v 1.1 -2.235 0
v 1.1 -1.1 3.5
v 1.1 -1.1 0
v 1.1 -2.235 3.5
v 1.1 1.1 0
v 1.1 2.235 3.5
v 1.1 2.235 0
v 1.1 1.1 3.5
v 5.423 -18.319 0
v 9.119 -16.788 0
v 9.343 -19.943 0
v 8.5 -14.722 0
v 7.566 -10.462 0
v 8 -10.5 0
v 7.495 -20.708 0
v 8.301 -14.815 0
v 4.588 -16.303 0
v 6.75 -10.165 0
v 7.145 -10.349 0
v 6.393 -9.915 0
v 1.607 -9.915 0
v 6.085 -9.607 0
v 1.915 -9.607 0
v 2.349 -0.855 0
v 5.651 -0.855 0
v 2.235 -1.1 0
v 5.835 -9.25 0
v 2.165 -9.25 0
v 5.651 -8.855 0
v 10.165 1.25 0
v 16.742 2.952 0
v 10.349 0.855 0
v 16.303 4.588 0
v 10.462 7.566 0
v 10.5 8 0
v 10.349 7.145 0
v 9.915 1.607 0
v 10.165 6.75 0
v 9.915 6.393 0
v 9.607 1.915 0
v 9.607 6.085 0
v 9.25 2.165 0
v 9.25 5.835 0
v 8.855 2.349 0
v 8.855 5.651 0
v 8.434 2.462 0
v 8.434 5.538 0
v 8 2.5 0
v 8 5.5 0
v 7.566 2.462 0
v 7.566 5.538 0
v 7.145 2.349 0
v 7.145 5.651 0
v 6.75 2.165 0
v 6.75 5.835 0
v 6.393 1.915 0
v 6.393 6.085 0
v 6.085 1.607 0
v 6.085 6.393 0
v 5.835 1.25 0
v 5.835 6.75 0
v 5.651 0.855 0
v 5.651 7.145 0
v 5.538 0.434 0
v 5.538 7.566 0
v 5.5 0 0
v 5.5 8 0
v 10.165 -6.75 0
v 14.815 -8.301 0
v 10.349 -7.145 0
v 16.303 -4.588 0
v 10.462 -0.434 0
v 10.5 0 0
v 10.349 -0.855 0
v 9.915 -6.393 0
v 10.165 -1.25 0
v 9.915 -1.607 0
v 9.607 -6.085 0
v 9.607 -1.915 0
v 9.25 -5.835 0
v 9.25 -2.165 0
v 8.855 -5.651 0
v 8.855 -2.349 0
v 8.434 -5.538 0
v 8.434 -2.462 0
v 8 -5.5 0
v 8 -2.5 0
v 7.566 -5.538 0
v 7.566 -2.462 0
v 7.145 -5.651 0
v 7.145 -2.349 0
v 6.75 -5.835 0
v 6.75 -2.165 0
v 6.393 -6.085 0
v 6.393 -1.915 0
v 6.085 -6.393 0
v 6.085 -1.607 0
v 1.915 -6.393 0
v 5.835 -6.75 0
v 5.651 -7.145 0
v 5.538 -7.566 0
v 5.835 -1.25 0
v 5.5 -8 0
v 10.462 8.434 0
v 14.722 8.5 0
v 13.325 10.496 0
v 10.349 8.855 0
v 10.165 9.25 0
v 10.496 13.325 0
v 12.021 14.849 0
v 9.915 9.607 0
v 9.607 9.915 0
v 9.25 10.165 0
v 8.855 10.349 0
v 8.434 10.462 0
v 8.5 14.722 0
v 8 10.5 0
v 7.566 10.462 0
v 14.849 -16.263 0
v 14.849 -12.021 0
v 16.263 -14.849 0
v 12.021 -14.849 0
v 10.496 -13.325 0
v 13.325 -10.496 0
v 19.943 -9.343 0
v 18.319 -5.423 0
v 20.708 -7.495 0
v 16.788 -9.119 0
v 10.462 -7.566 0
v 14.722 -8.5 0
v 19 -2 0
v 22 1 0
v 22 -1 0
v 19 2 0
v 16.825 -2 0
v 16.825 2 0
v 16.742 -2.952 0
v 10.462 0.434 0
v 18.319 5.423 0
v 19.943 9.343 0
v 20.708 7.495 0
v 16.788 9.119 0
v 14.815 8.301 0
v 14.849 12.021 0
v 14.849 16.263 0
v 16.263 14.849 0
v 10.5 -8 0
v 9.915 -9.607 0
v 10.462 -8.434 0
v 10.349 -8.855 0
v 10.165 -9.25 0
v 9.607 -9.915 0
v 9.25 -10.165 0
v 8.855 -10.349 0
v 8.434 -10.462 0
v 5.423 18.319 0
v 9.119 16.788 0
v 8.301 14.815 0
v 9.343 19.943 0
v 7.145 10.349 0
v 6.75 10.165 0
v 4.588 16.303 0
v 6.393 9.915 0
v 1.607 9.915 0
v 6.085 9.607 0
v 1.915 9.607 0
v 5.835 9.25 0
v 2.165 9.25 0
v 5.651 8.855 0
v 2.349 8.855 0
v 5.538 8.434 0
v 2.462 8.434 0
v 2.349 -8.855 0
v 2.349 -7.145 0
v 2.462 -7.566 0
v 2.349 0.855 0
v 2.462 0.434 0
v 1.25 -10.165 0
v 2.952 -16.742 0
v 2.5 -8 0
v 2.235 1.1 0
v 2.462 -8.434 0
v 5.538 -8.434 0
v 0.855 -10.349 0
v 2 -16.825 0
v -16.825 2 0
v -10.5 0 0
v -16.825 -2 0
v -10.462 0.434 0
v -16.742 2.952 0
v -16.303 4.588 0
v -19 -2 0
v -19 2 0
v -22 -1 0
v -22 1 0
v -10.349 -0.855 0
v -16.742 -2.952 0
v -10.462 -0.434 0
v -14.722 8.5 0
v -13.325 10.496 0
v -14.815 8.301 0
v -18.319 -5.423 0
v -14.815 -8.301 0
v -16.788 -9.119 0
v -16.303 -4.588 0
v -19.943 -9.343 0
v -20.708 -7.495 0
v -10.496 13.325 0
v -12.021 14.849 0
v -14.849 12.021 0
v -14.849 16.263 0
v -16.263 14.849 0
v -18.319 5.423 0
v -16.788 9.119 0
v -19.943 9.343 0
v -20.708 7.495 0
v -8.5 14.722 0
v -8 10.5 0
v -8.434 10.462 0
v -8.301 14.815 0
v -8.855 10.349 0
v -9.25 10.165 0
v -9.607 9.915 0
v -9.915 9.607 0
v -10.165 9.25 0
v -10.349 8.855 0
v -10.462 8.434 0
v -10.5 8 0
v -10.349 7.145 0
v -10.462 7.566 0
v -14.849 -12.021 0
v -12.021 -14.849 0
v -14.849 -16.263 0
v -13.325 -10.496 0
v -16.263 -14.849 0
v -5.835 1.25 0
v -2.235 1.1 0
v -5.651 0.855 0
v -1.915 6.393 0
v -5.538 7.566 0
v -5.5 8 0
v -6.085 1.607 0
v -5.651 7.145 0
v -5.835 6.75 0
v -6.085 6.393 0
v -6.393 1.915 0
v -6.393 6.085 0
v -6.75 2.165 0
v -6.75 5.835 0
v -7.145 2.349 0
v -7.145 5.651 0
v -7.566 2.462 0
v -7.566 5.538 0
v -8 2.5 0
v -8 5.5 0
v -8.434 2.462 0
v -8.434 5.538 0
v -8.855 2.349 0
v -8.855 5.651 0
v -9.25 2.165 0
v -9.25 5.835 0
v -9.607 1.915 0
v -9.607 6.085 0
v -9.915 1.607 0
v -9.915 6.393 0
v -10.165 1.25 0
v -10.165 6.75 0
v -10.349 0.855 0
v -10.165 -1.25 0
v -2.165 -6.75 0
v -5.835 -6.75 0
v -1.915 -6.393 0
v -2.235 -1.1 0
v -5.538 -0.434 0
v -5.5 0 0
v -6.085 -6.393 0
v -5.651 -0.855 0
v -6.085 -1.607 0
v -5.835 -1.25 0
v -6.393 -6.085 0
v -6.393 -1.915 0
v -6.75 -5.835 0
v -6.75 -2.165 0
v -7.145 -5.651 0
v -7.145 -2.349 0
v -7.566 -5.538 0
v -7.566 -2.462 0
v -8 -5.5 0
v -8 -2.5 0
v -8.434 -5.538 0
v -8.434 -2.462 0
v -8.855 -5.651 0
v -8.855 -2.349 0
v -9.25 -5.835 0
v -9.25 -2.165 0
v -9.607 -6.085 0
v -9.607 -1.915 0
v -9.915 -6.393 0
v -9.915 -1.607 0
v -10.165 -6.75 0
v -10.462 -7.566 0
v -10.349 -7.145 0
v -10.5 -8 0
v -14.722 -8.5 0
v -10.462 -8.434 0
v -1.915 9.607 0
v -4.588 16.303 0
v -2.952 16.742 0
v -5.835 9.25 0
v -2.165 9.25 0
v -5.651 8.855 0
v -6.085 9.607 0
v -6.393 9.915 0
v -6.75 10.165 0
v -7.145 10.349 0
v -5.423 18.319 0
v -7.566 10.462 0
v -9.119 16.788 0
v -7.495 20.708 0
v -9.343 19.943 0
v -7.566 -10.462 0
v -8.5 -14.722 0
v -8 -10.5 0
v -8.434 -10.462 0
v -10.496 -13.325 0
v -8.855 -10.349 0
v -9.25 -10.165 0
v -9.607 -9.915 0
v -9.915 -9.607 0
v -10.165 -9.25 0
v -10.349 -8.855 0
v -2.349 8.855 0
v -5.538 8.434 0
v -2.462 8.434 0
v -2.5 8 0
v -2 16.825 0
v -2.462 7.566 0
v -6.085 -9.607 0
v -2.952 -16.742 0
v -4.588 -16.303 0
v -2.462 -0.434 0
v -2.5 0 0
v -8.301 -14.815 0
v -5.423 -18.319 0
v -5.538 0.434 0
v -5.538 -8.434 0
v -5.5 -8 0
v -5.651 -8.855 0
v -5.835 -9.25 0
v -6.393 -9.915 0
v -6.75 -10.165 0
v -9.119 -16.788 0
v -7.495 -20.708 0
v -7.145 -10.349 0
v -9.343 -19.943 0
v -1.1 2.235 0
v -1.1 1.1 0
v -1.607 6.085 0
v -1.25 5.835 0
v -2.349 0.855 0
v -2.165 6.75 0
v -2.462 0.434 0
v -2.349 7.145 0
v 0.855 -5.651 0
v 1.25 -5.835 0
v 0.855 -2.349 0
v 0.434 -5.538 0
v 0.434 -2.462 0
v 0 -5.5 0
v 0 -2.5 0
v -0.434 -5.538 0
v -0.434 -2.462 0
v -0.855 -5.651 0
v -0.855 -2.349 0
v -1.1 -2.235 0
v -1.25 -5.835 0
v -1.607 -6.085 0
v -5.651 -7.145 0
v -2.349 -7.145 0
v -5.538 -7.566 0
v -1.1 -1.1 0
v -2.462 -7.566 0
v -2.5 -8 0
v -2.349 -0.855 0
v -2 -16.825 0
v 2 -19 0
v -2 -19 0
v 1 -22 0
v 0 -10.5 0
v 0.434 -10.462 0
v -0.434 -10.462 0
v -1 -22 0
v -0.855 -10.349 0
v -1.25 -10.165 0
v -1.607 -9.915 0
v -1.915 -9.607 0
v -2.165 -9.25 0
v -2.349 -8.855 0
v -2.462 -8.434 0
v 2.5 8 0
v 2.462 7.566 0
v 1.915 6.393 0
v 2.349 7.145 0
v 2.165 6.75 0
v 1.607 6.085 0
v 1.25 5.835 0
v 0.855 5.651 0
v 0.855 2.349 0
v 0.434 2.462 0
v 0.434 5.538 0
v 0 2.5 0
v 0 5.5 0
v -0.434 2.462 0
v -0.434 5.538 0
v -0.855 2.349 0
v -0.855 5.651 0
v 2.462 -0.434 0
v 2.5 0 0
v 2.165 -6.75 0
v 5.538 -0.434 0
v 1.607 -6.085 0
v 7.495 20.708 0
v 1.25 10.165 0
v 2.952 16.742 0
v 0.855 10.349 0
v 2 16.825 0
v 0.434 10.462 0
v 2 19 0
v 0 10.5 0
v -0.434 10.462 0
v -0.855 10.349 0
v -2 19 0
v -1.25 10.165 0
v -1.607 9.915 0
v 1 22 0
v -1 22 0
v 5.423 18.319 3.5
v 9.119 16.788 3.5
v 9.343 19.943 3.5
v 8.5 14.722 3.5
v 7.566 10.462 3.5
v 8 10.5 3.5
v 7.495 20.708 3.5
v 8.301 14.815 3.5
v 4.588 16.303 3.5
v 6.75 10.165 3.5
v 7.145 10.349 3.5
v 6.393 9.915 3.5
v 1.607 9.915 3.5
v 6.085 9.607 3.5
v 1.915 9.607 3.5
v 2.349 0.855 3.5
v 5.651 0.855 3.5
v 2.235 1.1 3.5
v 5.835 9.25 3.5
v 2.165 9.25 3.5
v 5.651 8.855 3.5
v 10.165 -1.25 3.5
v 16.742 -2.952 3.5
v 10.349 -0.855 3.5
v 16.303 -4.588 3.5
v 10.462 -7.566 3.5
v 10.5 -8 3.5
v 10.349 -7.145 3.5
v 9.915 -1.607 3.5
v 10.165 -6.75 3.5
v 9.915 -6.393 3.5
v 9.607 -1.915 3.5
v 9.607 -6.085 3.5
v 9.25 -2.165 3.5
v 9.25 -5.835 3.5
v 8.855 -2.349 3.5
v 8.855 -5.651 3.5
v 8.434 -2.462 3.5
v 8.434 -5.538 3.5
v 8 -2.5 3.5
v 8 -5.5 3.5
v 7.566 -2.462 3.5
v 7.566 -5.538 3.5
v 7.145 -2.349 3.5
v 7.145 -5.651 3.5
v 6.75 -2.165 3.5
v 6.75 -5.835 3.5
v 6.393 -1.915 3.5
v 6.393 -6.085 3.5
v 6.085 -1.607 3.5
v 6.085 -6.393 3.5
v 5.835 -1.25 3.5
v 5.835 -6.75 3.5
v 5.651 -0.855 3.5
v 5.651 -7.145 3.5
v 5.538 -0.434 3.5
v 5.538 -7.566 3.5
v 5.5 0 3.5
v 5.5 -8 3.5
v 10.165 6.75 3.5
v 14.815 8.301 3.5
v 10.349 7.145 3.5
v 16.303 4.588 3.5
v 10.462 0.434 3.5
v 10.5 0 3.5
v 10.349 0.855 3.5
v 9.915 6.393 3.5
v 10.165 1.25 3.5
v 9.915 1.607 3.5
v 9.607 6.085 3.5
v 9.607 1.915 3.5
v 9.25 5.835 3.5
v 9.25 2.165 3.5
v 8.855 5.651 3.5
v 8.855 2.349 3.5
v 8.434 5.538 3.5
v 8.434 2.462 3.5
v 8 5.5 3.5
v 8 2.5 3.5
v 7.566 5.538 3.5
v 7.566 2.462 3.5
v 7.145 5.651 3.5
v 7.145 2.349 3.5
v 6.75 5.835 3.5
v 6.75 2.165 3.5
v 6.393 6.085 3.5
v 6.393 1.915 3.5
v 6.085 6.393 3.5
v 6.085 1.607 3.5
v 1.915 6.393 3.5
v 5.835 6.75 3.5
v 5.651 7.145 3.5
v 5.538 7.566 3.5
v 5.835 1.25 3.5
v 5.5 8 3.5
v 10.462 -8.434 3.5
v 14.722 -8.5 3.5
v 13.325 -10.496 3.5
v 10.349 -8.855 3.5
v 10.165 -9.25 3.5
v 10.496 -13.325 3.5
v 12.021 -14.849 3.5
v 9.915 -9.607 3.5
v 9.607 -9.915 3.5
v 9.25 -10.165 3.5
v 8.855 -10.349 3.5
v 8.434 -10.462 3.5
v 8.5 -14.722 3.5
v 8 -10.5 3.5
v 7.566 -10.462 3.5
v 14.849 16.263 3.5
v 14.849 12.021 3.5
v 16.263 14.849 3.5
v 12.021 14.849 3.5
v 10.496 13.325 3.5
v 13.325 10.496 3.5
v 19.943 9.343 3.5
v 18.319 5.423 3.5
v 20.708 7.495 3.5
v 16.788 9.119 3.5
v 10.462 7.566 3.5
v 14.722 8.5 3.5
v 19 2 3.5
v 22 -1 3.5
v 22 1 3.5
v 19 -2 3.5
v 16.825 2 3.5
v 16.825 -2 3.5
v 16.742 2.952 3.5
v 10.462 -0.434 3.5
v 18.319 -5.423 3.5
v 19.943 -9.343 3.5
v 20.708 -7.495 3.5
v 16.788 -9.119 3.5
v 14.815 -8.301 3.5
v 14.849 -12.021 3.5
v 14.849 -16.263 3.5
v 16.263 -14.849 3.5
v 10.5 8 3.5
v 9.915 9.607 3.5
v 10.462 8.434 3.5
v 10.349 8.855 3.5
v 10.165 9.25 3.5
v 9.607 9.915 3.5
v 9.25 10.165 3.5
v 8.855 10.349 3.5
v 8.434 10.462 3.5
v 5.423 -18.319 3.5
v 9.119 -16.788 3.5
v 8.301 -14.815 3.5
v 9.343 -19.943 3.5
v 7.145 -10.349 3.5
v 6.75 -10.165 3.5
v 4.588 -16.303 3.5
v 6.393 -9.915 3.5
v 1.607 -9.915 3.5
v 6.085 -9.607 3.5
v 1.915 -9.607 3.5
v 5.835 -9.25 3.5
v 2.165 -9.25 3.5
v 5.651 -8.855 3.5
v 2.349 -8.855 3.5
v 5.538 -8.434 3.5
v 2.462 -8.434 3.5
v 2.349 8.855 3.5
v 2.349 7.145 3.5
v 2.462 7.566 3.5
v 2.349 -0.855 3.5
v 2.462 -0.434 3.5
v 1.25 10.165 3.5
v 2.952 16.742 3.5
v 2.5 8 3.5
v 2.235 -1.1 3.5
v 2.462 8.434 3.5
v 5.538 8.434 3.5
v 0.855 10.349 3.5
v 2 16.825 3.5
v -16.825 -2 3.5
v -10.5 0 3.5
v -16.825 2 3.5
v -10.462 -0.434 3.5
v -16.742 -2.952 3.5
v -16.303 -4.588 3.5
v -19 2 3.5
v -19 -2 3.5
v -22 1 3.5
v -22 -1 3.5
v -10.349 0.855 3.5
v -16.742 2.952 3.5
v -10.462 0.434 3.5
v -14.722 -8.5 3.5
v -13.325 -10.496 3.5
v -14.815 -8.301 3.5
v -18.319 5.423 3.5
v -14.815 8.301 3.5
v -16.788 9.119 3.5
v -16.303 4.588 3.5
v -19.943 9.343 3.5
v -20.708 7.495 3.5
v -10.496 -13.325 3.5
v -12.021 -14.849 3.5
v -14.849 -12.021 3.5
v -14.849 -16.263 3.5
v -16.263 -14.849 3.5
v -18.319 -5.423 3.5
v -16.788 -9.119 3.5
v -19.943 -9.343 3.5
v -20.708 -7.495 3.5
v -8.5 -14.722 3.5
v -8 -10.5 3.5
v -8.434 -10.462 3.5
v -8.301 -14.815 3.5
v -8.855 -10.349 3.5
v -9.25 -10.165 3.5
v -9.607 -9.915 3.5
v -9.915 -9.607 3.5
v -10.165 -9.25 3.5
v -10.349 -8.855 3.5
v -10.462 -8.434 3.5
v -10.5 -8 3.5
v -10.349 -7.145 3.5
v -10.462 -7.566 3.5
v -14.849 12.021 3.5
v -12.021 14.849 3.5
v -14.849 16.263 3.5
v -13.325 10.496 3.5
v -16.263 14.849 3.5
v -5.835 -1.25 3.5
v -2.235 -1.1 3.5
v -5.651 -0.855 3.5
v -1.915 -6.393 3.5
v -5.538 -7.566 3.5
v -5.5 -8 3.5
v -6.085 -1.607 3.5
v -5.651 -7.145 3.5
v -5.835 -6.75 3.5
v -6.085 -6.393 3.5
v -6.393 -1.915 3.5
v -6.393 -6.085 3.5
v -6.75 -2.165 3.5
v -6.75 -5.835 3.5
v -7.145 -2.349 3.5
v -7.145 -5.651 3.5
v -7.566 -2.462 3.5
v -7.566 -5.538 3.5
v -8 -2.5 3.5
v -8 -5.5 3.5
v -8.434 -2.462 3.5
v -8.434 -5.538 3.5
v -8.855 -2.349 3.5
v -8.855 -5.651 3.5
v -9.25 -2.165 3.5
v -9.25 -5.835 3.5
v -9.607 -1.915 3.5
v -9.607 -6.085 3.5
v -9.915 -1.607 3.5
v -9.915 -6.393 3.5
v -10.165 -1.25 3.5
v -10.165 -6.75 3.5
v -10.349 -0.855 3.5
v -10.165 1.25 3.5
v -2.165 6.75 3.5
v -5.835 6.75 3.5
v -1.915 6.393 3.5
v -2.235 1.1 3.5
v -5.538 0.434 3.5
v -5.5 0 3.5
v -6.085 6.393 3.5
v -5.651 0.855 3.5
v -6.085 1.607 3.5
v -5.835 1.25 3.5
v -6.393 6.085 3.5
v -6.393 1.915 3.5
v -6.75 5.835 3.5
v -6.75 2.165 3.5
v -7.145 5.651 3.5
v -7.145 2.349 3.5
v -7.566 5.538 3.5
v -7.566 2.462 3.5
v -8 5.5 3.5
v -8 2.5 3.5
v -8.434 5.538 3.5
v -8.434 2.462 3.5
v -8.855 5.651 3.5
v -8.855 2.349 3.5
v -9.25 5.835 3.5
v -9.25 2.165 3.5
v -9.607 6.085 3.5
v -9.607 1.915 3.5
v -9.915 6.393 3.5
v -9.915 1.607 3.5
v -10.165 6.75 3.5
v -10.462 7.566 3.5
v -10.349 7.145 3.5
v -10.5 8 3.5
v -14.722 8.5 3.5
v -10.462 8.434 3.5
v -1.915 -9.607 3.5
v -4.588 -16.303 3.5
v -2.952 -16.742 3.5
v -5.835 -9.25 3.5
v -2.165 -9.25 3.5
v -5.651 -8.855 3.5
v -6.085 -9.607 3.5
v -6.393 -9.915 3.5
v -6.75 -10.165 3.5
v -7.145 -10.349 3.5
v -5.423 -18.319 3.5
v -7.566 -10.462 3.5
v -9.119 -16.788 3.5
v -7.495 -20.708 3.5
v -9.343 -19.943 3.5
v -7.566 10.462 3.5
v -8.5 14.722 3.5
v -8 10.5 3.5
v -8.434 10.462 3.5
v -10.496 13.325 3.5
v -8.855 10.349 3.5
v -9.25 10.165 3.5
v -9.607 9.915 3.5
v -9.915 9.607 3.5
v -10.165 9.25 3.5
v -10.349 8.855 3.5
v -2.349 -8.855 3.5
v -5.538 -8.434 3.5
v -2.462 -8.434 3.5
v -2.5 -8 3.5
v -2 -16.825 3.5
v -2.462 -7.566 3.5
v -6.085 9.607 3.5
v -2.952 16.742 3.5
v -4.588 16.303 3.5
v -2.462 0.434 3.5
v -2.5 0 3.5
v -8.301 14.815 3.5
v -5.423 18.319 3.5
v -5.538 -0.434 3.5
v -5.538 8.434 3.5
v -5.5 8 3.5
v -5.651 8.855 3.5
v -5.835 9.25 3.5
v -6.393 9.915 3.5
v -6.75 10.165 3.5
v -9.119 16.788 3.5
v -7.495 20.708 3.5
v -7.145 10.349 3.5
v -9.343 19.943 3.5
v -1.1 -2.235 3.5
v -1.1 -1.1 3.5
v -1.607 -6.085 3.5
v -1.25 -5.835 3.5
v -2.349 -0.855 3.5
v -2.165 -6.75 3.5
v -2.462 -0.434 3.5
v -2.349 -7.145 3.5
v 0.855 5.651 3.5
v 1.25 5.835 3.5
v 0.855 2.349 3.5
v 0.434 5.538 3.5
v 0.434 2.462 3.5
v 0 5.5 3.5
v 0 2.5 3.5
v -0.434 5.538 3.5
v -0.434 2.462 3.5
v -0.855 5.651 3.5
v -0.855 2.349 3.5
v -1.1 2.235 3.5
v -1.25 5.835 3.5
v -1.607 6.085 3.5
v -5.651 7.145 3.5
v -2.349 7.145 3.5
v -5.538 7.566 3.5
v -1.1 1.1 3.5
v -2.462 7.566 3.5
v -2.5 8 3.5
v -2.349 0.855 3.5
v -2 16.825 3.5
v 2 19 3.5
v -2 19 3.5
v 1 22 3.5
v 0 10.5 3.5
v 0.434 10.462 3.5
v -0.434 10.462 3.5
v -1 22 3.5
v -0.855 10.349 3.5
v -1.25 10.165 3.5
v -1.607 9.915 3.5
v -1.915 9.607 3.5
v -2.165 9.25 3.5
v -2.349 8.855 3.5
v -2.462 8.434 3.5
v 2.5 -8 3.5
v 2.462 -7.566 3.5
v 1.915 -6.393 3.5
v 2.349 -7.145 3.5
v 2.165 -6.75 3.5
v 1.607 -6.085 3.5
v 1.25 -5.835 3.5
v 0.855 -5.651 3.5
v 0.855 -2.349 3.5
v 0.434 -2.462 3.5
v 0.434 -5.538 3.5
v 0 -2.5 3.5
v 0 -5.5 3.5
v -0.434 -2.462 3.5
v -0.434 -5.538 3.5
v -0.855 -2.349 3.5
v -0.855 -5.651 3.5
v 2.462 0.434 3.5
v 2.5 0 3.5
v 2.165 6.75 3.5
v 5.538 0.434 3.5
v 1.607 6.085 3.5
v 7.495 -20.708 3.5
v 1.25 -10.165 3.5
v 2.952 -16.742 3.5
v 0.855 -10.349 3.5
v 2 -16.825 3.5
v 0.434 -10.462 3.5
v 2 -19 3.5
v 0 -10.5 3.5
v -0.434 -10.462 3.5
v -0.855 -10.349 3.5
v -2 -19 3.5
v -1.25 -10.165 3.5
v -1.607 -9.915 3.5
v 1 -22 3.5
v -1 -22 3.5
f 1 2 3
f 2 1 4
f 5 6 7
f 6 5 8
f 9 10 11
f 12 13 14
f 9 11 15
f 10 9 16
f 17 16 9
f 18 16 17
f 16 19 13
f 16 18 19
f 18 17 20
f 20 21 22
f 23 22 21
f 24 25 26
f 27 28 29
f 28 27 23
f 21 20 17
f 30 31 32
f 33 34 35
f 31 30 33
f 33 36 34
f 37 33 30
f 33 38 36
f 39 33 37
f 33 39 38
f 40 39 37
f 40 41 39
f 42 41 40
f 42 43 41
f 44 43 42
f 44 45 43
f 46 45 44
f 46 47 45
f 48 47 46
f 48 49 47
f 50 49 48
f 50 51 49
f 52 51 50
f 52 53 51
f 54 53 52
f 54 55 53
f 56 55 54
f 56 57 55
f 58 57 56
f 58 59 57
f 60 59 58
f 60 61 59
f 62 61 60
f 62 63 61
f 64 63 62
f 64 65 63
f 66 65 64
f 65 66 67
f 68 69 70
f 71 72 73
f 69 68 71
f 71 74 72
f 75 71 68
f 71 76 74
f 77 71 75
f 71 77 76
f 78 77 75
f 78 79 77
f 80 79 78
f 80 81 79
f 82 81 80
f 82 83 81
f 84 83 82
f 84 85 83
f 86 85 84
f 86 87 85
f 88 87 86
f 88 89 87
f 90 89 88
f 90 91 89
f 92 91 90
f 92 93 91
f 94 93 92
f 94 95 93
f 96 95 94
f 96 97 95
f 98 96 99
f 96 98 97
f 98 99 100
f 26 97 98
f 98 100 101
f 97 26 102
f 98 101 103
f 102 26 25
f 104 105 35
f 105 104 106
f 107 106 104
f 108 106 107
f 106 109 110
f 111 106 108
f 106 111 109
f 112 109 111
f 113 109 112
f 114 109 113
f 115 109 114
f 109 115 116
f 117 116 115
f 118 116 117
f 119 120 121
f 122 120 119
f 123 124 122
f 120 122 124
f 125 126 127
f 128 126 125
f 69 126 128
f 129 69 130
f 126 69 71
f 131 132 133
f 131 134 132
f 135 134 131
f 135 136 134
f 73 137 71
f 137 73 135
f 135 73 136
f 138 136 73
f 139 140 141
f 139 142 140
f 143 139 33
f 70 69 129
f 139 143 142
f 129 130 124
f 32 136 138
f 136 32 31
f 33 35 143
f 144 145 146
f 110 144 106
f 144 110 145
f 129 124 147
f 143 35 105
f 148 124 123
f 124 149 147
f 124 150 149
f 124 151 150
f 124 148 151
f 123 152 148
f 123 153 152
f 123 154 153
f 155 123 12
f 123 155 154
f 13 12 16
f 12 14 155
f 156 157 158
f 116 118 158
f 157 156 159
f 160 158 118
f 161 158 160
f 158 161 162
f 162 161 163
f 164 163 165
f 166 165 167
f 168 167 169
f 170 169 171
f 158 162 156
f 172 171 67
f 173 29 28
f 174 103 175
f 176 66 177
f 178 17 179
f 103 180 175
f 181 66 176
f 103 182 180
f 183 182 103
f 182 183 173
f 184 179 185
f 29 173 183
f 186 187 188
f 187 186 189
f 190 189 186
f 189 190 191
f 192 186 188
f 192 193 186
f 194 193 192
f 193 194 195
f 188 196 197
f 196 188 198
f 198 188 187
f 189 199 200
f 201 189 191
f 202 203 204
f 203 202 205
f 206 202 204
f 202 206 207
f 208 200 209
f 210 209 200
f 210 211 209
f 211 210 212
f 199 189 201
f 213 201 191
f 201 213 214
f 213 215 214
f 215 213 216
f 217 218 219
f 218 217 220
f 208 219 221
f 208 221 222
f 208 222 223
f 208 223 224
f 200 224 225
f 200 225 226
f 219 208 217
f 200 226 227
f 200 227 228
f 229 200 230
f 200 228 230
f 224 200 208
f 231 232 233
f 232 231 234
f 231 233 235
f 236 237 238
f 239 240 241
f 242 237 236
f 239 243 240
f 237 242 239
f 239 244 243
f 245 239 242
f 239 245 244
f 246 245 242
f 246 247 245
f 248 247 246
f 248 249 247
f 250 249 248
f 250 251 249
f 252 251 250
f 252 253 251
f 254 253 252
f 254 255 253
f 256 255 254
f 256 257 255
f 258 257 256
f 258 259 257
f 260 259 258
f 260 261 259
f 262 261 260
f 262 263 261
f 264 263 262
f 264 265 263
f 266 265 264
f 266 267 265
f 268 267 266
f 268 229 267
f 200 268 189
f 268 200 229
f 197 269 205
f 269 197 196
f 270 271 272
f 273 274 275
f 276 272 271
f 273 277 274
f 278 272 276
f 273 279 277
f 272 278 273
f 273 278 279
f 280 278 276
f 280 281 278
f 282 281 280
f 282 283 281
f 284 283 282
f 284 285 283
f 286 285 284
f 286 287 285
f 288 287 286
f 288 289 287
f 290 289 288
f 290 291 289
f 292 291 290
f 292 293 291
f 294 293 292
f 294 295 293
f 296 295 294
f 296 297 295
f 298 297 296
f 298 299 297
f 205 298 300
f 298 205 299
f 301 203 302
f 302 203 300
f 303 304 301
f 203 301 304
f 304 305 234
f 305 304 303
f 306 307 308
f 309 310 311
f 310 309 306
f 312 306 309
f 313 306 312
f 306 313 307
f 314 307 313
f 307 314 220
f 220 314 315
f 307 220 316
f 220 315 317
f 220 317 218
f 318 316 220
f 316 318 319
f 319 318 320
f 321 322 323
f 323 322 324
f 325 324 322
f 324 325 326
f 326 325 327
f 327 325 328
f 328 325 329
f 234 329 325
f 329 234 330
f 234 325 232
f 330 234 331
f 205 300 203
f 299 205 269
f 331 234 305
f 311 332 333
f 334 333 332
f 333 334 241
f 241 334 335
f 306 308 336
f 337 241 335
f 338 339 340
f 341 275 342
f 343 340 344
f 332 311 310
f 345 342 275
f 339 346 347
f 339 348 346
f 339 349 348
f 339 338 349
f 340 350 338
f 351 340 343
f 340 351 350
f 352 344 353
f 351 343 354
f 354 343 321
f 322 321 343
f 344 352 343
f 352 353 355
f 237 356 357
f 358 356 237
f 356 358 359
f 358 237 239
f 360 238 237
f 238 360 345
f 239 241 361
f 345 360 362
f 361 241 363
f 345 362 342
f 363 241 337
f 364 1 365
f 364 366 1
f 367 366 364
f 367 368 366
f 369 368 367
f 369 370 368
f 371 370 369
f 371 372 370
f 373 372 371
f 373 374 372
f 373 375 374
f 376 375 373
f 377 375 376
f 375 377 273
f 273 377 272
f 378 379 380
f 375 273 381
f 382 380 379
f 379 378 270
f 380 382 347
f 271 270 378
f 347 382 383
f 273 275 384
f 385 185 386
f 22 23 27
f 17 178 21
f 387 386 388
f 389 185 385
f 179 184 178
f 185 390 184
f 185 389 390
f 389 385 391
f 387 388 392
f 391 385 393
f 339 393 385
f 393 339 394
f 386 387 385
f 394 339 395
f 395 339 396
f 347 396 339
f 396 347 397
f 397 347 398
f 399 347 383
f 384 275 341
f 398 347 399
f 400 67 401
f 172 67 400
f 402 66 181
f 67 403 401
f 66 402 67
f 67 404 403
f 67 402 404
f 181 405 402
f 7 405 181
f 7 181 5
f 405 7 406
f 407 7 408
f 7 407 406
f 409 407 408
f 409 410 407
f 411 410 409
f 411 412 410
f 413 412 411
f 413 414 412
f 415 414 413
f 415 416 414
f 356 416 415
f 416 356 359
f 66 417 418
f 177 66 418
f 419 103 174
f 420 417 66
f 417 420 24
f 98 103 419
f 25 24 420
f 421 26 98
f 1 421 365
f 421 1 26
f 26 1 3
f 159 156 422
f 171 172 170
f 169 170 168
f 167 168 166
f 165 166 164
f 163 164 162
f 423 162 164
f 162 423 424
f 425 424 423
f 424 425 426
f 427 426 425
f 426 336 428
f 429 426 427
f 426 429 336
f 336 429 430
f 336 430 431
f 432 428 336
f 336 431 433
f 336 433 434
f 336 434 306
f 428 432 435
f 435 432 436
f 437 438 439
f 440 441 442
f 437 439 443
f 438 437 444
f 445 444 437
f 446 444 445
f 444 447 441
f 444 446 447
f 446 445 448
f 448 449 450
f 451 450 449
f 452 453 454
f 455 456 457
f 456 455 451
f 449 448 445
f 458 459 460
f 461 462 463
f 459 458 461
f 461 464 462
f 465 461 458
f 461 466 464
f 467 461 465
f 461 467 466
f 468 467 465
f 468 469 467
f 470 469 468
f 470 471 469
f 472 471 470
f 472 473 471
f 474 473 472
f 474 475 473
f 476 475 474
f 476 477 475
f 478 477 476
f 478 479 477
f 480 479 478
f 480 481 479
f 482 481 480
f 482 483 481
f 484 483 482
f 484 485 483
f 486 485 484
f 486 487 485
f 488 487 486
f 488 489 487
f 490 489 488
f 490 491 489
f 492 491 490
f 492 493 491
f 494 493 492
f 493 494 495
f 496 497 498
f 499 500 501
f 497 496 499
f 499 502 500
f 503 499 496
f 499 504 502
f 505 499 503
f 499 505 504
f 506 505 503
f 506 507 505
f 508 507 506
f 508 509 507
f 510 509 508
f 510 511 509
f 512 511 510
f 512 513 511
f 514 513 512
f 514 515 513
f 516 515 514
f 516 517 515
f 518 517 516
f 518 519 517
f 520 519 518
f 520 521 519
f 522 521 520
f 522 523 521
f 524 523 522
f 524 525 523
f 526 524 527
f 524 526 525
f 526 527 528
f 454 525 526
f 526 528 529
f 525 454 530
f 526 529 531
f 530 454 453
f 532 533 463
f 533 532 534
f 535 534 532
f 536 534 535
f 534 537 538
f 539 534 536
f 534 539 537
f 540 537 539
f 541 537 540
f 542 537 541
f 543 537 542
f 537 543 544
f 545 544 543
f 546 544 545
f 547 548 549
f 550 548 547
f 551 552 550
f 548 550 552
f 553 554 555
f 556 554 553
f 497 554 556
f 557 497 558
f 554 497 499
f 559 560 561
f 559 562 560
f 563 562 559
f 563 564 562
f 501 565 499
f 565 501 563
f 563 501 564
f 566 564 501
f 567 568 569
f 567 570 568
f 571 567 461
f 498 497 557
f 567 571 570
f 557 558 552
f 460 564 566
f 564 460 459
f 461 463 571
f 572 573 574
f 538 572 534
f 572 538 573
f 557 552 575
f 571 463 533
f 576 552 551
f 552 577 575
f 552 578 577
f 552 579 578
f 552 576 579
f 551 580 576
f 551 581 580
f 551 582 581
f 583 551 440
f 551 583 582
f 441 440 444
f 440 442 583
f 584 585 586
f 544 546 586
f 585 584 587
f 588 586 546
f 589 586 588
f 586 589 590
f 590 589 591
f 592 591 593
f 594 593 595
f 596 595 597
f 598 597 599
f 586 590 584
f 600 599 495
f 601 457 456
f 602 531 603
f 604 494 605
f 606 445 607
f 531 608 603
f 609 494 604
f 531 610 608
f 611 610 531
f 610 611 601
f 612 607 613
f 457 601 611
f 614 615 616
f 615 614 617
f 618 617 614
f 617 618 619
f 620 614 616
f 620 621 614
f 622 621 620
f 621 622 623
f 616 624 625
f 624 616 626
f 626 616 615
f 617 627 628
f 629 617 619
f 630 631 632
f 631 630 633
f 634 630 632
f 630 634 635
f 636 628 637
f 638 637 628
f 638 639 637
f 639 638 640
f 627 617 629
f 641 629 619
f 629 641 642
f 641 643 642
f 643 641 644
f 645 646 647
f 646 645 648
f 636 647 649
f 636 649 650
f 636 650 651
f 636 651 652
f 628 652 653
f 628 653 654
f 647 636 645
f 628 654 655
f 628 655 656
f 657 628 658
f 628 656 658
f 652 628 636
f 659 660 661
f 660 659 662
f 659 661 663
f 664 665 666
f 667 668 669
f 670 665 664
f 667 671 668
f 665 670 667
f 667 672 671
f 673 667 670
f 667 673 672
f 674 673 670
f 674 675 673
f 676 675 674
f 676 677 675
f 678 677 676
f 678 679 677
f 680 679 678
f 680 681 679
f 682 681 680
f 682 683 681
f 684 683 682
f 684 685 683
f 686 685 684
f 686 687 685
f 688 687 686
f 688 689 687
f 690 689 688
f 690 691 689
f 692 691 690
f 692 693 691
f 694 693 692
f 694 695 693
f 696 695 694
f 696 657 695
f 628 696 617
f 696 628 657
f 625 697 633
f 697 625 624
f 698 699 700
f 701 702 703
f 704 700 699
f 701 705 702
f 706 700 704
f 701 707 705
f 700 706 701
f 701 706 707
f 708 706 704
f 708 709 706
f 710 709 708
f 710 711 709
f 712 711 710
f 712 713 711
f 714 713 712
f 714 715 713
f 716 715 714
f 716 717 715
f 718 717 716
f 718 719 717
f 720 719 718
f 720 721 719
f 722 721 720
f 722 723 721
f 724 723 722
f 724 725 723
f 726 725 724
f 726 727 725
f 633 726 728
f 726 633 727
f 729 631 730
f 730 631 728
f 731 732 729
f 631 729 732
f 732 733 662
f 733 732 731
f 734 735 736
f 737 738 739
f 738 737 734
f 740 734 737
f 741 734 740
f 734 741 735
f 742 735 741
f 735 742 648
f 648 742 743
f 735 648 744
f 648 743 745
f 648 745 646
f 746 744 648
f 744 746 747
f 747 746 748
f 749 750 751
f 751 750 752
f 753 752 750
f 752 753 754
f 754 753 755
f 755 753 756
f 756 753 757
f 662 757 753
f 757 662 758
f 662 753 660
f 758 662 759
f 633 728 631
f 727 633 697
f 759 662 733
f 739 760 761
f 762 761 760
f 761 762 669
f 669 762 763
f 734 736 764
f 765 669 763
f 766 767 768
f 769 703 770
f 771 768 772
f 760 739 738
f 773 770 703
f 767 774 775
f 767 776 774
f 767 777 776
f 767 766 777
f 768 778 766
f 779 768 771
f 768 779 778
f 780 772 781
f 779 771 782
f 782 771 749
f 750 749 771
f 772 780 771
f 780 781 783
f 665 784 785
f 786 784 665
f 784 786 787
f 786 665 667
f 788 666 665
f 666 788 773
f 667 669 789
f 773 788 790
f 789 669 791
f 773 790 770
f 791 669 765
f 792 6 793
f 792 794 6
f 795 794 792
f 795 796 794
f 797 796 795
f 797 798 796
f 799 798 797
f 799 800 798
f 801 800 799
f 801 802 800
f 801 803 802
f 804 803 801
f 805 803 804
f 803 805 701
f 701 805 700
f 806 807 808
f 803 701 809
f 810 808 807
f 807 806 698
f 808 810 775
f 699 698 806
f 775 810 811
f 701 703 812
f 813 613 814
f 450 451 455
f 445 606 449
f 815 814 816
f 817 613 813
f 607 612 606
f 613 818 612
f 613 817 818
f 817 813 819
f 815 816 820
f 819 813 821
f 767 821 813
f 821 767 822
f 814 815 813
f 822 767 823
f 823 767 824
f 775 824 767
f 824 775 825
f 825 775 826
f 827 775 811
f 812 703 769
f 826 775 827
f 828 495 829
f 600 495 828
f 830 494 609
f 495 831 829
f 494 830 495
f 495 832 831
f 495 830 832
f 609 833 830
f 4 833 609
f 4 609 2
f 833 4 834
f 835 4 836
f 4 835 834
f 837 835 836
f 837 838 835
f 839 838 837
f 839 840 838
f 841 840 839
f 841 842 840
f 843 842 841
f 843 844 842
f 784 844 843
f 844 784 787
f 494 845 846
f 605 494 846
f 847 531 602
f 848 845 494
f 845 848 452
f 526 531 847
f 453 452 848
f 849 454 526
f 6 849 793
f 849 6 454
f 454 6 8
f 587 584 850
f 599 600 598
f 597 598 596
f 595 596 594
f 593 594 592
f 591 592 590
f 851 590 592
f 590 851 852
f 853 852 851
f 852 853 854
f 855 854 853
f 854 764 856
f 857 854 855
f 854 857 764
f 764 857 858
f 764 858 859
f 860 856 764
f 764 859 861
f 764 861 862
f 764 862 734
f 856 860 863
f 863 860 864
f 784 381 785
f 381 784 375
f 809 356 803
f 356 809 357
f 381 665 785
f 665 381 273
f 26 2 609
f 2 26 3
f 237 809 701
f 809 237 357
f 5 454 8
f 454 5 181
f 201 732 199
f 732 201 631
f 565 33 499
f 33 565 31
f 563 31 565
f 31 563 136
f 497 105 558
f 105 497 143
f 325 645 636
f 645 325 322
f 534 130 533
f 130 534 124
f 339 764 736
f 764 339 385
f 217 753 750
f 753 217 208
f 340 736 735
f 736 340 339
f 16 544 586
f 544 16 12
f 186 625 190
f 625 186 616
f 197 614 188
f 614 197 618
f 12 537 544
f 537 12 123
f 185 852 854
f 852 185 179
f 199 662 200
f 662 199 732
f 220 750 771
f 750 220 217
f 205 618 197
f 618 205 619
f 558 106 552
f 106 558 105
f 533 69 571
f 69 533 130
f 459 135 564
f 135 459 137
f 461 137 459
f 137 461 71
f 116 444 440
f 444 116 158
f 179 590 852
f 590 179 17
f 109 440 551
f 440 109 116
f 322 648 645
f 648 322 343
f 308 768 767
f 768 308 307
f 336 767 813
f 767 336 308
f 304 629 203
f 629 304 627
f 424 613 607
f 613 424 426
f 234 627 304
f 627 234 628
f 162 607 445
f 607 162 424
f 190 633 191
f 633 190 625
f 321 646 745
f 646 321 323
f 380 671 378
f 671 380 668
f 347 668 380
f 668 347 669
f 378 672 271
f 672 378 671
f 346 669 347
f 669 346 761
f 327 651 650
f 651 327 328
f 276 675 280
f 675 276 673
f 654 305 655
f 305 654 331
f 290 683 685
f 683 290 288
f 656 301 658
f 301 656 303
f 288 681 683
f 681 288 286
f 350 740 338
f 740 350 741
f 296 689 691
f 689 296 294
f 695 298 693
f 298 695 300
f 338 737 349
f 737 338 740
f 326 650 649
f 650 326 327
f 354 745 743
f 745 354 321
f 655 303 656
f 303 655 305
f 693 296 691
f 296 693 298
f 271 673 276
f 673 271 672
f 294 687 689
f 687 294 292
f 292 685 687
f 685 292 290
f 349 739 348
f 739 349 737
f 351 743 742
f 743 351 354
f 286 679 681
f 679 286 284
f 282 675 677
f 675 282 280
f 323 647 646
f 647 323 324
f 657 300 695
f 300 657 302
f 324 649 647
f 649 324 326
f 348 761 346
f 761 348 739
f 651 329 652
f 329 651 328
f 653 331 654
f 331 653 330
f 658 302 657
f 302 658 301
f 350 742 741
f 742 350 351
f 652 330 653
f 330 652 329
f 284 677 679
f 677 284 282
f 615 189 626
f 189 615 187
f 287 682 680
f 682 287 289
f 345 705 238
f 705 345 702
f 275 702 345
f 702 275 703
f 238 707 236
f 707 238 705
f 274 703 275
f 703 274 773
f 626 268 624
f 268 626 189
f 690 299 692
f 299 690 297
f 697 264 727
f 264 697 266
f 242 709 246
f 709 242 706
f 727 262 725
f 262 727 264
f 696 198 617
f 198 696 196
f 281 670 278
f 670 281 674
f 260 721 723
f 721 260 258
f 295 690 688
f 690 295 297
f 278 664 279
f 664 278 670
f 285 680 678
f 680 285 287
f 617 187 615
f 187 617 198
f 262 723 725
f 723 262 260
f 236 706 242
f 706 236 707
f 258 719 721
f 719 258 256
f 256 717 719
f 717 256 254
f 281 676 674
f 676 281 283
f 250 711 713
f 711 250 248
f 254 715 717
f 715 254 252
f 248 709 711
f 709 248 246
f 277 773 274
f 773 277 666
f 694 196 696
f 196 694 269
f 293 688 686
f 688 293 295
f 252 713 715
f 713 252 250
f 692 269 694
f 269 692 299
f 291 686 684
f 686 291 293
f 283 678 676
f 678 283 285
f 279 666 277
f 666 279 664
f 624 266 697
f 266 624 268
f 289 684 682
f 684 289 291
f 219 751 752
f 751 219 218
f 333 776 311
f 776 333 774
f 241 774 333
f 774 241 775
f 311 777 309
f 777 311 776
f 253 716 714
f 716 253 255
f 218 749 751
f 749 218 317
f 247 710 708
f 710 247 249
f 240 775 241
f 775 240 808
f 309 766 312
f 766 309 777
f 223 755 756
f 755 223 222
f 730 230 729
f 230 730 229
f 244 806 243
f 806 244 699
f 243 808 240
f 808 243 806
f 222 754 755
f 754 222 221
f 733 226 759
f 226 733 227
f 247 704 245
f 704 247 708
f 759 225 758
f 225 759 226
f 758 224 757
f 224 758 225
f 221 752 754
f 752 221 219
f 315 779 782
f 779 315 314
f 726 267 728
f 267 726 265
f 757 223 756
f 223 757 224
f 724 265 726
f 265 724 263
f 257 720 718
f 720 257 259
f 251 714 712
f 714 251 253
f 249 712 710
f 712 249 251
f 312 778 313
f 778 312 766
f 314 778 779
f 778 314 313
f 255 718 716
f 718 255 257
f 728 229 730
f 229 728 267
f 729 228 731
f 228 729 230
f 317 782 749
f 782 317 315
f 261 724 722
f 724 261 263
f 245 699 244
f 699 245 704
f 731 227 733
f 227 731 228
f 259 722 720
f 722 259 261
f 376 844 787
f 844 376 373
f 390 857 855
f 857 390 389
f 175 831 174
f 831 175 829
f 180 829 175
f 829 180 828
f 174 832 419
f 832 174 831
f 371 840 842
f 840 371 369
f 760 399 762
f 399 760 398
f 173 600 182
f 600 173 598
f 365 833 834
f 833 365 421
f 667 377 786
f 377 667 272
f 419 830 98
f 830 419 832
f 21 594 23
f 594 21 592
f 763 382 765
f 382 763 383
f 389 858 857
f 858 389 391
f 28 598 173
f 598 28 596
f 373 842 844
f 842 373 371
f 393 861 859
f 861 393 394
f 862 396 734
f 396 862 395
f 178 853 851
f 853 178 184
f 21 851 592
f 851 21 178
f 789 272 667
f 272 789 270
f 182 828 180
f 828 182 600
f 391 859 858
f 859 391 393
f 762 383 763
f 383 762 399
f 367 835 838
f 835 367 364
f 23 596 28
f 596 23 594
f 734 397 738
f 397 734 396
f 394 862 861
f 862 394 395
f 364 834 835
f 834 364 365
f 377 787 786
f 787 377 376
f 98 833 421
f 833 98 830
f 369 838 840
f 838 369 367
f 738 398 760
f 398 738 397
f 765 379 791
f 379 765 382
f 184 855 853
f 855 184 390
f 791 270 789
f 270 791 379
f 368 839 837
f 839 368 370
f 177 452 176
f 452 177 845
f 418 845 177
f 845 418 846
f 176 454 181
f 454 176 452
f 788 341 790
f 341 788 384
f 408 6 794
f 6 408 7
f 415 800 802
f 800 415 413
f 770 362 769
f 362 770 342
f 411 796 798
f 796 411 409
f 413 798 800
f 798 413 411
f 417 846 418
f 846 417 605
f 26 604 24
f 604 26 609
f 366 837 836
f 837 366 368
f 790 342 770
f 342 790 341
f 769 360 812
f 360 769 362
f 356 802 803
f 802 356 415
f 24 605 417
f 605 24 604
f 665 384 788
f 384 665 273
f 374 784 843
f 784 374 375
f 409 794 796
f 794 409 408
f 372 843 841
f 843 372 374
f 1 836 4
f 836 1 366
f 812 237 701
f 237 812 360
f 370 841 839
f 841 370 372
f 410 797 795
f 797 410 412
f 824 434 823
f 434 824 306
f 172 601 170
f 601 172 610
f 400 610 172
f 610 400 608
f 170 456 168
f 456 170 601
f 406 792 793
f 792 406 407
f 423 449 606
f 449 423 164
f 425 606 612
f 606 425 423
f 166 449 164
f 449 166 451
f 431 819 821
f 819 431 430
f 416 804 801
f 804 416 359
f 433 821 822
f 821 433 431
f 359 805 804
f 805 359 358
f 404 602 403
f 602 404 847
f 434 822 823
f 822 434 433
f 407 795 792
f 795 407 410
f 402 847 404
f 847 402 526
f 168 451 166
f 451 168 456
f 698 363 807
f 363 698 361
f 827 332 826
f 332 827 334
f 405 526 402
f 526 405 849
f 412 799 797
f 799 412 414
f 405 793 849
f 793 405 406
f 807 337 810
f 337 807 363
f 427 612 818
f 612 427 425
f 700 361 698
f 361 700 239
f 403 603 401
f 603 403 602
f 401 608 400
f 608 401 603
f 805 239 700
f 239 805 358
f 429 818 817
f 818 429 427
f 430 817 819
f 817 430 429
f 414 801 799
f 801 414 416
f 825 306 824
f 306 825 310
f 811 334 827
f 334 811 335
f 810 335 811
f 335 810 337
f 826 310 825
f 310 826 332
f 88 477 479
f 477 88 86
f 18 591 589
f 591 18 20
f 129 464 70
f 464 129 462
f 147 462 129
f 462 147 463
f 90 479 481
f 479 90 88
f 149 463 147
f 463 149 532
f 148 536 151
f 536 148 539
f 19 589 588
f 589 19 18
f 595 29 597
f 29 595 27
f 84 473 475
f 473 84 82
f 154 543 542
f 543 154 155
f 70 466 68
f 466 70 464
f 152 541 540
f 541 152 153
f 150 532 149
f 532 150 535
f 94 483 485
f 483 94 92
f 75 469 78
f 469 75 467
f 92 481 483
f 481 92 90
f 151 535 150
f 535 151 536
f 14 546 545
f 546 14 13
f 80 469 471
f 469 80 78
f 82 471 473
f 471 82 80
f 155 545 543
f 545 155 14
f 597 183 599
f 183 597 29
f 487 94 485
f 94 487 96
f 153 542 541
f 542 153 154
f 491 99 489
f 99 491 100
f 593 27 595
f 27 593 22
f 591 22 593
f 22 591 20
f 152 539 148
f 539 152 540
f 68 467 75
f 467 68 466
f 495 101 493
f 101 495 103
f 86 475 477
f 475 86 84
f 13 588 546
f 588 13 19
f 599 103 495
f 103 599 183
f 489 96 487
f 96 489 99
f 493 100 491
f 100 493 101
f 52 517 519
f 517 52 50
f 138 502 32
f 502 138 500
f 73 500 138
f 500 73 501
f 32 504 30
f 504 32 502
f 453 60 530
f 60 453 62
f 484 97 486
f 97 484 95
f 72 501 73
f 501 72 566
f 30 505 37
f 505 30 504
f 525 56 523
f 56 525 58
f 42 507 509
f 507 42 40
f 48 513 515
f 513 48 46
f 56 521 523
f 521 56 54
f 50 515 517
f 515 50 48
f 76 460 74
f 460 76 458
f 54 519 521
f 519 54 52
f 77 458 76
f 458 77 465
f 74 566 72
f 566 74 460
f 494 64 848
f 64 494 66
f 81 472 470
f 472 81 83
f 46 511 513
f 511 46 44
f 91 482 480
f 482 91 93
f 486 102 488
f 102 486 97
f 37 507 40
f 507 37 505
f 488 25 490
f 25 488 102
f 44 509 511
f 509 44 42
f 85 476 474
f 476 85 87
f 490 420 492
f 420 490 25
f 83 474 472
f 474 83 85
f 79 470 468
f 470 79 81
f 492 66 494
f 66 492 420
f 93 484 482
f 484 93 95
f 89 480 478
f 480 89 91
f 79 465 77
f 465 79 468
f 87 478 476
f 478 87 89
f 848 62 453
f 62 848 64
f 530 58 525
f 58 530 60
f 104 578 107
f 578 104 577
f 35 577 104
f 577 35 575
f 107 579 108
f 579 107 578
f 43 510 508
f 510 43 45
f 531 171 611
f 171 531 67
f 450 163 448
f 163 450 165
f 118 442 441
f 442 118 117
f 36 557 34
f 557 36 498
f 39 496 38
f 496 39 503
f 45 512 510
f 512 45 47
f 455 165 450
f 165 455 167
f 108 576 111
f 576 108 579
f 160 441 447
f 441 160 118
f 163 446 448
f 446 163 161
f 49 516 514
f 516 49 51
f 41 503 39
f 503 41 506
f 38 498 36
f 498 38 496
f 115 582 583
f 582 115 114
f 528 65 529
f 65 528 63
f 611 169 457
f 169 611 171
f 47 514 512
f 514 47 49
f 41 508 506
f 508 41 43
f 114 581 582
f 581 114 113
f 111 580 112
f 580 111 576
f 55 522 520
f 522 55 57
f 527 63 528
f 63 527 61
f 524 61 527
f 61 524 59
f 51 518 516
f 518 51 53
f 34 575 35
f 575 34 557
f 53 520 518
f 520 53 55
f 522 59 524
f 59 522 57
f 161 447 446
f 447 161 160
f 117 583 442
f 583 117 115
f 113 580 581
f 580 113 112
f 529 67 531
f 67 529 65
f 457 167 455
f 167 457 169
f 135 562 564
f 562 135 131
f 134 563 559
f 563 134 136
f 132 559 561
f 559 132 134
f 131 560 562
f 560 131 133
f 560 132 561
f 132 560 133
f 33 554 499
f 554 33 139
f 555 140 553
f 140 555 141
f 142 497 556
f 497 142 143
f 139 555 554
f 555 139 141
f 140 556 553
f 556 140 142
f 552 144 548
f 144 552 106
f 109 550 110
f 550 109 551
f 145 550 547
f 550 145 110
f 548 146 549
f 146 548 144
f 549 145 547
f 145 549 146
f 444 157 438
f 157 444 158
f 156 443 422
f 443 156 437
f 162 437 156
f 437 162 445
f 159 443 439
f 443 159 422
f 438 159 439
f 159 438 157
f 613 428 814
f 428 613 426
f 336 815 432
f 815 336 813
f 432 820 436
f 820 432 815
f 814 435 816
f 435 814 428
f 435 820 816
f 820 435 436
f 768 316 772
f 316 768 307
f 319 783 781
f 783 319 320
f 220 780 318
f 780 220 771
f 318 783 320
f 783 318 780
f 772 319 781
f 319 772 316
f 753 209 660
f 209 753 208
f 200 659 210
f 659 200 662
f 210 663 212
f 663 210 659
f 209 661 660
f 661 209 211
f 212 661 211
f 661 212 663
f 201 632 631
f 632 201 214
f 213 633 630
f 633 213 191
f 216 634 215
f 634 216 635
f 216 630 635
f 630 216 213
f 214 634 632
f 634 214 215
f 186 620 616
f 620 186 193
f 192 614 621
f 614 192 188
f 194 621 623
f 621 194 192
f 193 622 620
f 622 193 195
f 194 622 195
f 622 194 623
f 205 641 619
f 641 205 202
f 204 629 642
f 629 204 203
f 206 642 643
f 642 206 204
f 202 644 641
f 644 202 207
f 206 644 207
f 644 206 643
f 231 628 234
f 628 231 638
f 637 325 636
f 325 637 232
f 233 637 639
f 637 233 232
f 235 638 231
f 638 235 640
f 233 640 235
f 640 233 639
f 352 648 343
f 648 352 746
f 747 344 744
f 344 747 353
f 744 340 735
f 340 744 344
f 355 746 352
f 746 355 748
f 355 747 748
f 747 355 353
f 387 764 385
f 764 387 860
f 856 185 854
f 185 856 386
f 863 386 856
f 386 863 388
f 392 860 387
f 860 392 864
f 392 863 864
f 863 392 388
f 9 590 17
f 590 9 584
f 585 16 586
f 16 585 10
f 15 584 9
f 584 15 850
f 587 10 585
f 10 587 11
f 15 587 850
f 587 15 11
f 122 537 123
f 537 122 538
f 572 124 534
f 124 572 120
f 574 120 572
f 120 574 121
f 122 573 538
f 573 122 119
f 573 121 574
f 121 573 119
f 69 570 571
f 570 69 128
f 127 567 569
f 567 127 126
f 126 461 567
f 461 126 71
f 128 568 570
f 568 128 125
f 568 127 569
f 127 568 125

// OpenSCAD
module bar_hole(l){
  t=1.8+0.4;
  d=4.7+0.4;   
  rotate([90,0,0])
  translate([-t/2,-d/2,0])
  union(){
  cube([t,d,l]);
  translate([+t/2-d/2,-t/2+d/2])
  cube([d,t,l]);
}
}



module gear(){
//    color("blue")
//translate([-150,16,90])
//rotate([90,0,0])
//import("/home/bc/Downloads/New Model.stl");

// used in differences
epsilon=1;

d=34;
h=3.5;
    
 // center hole   
difference(){    
  cylinder(d=8,h=h,$fn=36); 
  translate([0,0,h]) rotate([90,0,0])    bar_hole(h);
}

// gear crown
difference(){    
  cylinder(d=d,h=h,$fn=36); 
  cylinder(d=d-2,h=h,$fn=36); 
  // cylinder(d=8,h=h,$fn=36);  // for round
}

// mantisse
translate([0,0,0])
difference(){    
  cylinder(d=d,h=3.5,$fn=36); 
 
  for(x=[floor(-d/16)+2:floor(d/16)-1])  
      for(y=[floor(-d/16)+2:floor(d/16)-1])
          translate([x*8,y*8,0])
          cylinder(d=5,h=20,$fn=36); 
}

    
  //union(){
//    translate([0,0,h]) rotate([90,0,0])    bar_hole(h);
    
    //translate([10,0,0])  
       //cylinder(d=5,h=h,$fn=36); 
//}
//}


for(a=[0:360/16:360])
rotate([0,0,a])

translate([22,0,0])
union(){
rotate([0,0,90])
tooth(h);
}

}

module tooth(h){
linear_extrude(height=h)
 polygon( points=[[0,0],[1,0],[2,3],[2,6],[-2,6],[-2,3],[-1,0]] );
}

gear();
